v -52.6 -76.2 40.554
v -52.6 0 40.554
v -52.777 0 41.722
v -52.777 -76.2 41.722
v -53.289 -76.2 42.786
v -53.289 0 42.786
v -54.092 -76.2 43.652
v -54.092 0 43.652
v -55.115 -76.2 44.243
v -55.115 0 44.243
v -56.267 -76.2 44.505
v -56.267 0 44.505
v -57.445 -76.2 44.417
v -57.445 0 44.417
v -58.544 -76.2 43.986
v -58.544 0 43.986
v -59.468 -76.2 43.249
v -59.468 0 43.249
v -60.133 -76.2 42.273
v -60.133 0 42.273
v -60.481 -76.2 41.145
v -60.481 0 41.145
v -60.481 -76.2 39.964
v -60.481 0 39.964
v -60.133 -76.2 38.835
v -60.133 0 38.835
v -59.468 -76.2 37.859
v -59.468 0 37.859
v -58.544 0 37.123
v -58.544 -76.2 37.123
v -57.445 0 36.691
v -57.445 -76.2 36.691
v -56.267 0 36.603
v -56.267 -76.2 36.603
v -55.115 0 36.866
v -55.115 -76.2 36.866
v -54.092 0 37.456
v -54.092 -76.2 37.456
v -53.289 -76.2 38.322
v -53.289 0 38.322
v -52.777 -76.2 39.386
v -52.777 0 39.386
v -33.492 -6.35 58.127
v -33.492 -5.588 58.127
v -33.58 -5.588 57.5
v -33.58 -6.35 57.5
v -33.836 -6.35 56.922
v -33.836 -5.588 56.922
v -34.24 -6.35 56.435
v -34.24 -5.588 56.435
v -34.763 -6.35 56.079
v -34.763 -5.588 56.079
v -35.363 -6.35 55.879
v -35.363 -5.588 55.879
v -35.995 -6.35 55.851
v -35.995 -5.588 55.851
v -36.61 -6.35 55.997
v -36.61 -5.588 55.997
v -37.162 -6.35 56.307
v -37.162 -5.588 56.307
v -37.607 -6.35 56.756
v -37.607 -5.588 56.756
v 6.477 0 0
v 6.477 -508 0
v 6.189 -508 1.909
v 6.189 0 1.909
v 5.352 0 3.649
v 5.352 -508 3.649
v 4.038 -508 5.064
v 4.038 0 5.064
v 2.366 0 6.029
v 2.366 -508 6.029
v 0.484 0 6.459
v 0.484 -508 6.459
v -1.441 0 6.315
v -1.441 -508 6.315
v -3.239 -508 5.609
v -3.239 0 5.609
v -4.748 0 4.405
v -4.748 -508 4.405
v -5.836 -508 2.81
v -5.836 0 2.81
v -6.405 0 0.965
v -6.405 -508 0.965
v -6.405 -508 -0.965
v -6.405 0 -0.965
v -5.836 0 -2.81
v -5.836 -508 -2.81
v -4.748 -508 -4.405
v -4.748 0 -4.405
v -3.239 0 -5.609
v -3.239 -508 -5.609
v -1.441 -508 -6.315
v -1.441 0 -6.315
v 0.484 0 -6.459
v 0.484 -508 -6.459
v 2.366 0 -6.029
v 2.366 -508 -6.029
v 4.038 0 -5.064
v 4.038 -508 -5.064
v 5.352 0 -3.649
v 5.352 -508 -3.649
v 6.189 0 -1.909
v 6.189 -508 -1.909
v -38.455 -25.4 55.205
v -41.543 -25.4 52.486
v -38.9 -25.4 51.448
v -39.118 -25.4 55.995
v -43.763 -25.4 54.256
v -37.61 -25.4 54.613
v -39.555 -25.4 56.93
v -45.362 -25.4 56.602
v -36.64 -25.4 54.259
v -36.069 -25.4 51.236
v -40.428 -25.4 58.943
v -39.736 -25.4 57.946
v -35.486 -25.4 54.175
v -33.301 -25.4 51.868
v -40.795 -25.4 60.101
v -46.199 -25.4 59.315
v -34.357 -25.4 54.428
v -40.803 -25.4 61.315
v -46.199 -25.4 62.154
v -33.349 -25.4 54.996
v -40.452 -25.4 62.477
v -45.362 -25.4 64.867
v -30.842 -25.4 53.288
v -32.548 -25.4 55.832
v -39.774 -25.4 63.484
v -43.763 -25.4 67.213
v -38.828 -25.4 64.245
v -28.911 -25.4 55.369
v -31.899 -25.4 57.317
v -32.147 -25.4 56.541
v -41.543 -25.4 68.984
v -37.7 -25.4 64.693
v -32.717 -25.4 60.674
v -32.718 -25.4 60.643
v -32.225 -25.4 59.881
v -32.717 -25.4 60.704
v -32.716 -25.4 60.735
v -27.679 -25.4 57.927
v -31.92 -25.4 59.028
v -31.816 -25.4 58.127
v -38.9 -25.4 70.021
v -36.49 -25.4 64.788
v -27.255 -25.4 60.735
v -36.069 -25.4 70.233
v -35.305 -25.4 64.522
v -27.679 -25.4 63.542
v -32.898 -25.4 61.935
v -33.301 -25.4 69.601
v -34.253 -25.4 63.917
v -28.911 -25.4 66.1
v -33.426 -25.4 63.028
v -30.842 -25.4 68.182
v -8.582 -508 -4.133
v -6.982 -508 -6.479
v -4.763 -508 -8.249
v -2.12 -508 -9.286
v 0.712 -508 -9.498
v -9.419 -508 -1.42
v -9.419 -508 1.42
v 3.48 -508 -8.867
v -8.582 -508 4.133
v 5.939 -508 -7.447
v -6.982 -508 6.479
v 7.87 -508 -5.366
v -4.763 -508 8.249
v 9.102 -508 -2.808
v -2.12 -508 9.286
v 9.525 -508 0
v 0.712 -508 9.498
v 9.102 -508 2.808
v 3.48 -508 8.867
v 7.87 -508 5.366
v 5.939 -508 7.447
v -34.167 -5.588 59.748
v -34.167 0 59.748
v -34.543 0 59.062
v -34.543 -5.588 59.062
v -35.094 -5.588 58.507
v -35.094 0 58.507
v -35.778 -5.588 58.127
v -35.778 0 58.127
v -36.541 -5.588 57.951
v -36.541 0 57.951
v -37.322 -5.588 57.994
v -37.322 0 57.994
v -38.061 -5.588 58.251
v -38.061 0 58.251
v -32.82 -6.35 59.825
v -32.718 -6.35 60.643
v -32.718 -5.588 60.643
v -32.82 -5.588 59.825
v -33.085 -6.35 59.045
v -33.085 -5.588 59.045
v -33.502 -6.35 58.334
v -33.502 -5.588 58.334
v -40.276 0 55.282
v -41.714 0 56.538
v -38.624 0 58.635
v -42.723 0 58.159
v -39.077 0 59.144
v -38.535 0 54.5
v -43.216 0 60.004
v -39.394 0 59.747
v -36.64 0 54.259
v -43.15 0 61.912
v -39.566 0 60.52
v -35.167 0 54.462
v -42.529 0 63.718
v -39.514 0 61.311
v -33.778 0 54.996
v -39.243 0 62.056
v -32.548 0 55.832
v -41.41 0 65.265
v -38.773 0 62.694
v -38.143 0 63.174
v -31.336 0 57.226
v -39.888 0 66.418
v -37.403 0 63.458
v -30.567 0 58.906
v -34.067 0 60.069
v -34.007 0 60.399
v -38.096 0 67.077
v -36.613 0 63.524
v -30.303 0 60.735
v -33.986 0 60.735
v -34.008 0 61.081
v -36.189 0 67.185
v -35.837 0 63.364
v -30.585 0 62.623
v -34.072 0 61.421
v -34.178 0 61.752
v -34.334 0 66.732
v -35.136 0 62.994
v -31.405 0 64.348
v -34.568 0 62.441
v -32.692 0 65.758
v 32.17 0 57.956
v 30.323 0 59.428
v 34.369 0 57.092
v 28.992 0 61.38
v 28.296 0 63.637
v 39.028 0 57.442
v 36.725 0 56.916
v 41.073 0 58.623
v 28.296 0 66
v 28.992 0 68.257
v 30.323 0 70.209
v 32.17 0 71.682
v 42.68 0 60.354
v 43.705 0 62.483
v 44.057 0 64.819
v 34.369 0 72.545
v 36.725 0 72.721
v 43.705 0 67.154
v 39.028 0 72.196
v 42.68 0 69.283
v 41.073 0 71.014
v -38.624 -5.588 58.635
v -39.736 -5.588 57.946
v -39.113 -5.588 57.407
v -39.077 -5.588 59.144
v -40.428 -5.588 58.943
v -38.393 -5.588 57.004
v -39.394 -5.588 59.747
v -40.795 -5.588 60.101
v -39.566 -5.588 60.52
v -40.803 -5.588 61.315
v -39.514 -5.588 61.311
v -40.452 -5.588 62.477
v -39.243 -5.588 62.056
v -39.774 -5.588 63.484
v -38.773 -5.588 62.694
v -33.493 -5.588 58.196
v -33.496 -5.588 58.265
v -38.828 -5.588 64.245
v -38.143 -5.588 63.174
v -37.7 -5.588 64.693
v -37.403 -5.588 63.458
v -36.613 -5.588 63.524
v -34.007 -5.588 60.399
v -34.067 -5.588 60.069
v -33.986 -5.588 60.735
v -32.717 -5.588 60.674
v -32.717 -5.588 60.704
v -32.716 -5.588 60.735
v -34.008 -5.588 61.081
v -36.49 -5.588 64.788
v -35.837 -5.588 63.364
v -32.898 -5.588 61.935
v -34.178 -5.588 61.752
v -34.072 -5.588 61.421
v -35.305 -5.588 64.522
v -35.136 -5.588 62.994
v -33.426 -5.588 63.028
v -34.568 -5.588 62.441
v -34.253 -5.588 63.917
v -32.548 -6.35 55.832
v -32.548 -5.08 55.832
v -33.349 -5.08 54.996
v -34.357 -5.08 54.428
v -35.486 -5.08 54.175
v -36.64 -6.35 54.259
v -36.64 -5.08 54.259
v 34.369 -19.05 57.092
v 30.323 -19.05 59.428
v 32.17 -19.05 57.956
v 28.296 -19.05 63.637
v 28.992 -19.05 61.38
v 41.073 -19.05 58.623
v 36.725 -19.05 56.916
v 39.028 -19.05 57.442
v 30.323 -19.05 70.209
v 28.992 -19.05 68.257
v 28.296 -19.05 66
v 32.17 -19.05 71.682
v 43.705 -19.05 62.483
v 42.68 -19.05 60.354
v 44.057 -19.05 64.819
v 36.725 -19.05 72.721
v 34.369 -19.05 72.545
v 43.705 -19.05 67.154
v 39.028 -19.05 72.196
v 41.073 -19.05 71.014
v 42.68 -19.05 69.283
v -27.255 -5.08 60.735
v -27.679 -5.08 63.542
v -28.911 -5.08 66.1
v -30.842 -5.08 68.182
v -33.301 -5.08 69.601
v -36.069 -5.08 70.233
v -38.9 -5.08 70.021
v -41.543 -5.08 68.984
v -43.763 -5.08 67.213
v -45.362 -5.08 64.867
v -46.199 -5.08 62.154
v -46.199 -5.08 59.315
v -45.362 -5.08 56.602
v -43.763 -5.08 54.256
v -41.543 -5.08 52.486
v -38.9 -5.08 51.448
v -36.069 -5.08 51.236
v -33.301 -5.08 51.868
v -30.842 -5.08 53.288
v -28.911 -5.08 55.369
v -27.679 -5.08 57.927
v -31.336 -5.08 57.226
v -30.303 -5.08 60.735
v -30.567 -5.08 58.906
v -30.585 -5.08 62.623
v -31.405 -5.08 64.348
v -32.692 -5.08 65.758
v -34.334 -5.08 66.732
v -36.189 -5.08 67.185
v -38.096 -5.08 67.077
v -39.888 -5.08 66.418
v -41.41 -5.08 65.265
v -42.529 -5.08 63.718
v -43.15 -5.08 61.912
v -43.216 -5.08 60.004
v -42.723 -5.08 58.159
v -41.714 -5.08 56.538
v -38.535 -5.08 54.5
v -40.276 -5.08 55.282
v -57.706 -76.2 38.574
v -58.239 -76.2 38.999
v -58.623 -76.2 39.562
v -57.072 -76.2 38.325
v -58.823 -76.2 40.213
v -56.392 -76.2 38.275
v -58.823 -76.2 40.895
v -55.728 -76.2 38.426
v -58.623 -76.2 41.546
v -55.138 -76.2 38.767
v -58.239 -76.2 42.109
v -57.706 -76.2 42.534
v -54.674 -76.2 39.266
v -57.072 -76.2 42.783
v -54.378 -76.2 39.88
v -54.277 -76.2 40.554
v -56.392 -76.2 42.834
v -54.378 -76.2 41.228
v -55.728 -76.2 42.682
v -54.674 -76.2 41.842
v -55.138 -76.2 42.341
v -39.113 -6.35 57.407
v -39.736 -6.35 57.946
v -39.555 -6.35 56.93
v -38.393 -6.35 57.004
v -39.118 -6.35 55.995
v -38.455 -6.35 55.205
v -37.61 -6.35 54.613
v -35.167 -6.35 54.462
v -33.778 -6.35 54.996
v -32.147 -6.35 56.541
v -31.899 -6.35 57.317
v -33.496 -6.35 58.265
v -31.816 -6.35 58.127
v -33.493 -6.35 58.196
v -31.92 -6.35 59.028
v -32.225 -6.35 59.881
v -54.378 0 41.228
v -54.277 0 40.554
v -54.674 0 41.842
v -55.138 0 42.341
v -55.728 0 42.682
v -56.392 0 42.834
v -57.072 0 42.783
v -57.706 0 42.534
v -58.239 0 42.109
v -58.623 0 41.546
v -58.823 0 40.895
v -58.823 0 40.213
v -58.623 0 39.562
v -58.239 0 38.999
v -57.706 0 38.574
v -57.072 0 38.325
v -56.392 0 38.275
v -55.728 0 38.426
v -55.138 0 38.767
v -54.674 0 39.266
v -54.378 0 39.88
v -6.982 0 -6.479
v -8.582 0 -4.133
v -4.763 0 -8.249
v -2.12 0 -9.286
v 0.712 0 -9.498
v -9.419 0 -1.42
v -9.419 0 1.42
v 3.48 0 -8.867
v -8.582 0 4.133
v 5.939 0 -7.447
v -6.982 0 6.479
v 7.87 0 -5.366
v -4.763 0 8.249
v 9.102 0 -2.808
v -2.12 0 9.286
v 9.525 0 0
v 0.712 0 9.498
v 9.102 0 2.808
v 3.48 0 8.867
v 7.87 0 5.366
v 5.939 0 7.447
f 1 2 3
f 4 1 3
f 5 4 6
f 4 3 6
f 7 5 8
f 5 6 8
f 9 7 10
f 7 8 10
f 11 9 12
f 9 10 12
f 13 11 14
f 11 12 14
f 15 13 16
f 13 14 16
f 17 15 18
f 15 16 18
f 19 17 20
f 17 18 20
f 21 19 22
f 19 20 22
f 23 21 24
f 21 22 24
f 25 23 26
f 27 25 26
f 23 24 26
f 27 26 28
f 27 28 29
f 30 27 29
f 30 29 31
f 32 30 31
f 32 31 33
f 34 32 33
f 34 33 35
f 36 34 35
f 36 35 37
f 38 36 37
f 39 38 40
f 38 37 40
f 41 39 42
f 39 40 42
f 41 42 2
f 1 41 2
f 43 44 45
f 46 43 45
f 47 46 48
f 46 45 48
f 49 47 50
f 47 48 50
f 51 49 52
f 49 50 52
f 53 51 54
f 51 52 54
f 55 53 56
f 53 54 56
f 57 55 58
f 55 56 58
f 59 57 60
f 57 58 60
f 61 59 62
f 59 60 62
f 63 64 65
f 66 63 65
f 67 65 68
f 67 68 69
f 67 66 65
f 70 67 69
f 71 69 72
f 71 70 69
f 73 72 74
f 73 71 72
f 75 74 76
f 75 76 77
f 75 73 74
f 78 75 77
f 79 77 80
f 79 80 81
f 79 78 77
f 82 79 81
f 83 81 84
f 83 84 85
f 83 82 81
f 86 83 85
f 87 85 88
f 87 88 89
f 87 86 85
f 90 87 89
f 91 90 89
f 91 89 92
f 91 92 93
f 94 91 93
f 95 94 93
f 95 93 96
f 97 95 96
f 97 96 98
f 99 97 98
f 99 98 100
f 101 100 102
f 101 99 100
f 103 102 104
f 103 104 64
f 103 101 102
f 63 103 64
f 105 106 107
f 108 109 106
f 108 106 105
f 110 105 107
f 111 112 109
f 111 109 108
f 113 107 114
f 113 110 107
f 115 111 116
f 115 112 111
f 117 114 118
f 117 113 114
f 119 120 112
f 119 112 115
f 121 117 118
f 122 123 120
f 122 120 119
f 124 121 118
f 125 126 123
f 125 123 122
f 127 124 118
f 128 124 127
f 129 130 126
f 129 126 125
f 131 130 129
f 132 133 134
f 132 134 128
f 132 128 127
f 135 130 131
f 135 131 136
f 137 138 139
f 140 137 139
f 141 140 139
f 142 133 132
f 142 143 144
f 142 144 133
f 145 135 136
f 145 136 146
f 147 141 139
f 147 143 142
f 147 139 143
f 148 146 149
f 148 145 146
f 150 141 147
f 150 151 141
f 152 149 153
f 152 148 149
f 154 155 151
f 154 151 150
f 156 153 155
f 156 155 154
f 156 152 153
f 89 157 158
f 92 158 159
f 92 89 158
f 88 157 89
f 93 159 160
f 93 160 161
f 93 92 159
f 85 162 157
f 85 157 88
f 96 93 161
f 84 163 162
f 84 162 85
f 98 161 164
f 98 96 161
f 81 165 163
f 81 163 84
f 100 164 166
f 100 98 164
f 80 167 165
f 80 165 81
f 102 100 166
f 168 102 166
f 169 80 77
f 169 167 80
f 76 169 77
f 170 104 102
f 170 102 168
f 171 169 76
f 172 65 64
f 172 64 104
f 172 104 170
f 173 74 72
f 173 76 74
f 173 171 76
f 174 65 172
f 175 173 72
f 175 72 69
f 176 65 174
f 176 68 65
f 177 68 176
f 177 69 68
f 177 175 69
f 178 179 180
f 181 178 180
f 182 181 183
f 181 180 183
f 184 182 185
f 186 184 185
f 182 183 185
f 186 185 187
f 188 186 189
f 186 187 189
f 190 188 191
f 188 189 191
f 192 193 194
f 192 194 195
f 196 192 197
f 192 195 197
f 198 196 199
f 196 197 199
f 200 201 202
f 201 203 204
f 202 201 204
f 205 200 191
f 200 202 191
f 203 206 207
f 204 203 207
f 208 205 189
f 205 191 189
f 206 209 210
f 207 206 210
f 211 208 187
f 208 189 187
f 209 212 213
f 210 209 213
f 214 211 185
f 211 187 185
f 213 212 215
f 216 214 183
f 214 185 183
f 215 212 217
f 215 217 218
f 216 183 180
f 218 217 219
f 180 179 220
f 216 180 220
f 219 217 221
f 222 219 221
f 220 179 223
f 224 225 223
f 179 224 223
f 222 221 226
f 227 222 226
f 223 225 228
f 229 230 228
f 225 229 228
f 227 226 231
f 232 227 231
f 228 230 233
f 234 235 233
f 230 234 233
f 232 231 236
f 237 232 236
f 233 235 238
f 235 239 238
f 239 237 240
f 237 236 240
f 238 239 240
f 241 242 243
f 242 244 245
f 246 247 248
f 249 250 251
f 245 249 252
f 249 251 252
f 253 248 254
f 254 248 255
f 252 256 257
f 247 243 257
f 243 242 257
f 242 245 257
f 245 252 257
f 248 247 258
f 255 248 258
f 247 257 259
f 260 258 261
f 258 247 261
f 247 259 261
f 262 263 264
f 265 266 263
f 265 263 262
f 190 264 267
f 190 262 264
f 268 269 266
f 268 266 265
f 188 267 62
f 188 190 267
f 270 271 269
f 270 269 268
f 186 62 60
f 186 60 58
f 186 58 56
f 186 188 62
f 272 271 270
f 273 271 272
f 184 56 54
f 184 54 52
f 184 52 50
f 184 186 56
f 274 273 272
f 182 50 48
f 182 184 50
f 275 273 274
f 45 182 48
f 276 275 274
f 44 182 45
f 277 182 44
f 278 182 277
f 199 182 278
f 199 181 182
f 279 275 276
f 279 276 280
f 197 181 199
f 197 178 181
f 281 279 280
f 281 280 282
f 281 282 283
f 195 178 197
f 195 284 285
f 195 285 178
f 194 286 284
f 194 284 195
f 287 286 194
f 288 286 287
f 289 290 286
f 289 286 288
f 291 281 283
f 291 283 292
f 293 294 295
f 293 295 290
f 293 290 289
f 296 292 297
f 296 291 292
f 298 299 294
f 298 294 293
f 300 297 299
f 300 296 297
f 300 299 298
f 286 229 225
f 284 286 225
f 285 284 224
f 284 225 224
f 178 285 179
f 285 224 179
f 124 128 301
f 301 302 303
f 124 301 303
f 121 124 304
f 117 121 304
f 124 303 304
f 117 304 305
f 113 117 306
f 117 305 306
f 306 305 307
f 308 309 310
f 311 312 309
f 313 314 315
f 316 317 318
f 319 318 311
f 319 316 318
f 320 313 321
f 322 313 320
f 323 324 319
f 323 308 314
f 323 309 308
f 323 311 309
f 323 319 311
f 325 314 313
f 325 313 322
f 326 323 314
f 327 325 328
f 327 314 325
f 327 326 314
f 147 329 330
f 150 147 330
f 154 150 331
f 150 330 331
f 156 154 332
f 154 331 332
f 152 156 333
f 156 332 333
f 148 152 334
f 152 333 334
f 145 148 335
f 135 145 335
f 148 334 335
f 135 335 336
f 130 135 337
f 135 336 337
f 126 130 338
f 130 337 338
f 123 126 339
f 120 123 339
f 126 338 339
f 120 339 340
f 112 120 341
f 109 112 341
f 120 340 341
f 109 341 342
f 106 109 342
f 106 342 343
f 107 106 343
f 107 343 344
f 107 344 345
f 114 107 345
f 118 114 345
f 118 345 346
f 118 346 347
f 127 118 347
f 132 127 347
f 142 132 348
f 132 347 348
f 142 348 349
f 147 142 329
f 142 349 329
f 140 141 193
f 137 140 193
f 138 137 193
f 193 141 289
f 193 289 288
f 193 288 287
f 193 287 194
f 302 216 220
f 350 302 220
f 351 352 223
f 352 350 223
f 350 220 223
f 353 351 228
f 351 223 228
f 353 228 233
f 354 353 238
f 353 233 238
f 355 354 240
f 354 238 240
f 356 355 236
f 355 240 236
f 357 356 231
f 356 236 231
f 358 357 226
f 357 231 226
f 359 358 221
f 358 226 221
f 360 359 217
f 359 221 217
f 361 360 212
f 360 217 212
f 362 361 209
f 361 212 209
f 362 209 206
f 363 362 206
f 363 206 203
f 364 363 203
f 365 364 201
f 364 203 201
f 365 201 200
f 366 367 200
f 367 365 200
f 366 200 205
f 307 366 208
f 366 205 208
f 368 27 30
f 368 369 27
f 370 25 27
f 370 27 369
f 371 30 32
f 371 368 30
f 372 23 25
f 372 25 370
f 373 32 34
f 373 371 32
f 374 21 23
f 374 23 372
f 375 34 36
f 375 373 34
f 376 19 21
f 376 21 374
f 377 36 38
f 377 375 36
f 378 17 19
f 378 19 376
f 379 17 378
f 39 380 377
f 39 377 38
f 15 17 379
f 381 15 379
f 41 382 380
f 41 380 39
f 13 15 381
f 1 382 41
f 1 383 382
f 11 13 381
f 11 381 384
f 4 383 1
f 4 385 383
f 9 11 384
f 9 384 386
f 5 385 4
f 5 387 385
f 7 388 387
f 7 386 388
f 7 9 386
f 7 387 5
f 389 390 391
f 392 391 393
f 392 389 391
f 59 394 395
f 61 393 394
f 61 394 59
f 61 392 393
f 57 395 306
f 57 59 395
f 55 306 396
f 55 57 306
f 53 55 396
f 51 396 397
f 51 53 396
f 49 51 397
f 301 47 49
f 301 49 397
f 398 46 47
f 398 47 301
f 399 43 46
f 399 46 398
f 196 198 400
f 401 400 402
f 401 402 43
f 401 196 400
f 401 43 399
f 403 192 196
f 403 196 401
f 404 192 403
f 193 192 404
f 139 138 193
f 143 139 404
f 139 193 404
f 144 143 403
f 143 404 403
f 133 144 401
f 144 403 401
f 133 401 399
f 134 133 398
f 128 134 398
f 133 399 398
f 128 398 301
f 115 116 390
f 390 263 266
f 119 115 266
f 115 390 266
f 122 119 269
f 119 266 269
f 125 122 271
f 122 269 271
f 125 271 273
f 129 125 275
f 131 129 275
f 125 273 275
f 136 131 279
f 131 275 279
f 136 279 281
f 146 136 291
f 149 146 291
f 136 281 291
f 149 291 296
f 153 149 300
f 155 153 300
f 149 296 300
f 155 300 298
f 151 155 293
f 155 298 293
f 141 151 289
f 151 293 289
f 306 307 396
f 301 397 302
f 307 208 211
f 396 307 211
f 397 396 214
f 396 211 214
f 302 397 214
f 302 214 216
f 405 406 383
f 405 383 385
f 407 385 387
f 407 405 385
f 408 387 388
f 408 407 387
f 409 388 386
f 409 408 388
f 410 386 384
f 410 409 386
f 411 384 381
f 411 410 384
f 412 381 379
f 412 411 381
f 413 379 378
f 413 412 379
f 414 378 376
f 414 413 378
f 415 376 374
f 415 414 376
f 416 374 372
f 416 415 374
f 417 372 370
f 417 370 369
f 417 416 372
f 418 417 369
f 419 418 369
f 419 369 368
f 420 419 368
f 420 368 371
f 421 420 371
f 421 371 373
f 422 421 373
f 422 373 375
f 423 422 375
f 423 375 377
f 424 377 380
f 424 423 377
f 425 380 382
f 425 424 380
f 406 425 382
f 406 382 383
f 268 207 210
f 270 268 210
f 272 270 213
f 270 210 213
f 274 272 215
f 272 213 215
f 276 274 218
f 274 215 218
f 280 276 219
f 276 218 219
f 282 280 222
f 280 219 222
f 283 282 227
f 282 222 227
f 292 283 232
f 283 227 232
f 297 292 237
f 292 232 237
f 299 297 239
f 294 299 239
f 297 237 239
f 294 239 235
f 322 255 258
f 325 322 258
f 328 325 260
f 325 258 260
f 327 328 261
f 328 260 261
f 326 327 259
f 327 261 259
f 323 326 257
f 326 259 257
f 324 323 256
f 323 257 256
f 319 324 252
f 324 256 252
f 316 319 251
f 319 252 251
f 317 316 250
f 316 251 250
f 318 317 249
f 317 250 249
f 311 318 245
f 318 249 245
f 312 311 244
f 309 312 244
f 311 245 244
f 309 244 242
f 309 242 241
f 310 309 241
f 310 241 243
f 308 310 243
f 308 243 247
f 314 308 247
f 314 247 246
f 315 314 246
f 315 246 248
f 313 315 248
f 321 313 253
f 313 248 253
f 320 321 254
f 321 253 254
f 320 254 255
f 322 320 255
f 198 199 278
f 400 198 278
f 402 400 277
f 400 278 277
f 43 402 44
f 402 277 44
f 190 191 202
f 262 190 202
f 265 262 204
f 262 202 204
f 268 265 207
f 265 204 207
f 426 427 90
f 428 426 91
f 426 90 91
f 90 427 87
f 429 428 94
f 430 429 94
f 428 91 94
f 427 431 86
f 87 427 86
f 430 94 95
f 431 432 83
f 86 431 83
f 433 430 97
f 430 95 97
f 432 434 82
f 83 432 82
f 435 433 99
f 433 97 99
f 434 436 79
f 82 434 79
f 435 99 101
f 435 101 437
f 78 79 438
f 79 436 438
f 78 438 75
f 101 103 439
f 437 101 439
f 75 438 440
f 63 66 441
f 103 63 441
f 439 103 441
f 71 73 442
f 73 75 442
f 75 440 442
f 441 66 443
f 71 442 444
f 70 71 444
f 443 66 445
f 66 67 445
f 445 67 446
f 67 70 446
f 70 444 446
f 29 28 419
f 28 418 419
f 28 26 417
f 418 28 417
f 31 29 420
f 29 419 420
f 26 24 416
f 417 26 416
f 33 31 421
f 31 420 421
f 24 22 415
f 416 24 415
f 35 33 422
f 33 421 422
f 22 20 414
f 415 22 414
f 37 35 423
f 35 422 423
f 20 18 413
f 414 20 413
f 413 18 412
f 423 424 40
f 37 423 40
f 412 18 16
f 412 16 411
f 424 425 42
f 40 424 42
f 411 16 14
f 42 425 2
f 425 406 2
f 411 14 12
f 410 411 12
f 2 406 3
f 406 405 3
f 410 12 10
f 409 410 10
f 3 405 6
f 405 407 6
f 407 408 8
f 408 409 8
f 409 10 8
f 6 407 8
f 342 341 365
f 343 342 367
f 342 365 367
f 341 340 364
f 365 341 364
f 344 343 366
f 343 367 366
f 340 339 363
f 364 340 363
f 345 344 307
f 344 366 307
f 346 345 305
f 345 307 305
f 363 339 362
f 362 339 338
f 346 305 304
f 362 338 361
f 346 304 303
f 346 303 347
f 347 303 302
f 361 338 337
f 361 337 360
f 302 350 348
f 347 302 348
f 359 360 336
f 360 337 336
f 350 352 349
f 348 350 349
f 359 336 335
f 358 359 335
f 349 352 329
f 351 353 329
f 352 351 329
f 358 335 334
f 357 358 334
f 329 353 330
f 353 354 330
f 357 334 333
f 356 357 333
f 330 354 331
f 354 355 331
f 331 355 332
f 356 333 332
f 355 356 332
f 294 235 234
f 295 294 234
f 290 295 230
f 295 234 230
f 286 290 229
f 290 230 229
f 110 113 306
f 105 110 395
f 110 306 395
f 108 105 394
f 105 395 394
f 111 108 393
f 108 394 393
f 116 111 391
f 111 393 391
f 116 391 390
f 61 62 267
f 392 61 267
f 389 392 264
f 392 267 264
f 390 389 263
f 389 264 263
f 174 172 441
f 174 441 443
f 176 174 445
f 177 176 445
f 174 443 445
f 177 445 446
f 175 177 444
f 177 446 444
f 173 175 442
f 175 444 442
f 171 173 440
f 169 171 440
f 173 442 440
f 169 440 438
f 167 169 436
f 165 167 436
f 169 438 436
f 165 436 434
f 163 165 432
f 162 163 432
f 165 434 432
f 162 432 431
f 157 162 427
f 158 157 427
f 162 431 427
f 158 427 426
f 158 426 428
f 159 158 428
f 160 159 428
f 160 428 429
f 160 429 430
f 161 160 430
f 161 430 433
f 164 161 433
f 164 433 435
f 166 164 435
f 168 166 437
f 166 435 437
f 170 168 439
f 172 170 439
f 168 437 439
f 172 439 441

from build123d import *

# Parameters (mm, degrees)
F0_R     = 9.525
F0_R_2   = 6.477
F1_DEPTH = 508
F2_DEPTH = 19.05
F0_R_3   = 7.9248
F3_DEPTH = 6.35
F4_DEPTH = 5.588
F5_START = 5.08
F5_DEPTH = 20.32
F6_DEPTH = 6.35
F7_DEPTH = 5.588
F0_R_4   = 3.9624
F0_R_5   = 2.286
F8_DEPTH = 76.2


with BuildPart() as f1:
    # F0 (on Front) → F1 (new body)
    with BuildSketch(Plane.XZ):
        Circle(F0_R)
        Circle(F0_R_2, mode=Mode.SUBTRACT)
    extrude(amount=F1_DEPTH)


with BuildPart() as f2:
    # F0 (on Front) → F2 (new body)
    with BuildSketch(Plane.XZ):
        with BuildLine():
            ThreePointArc((-32.547757087, 55.8320304582), (-30.8912183046, 58.0386997075), (-30.3034840207, 60.7346370816))
            ThreePointArc((-30.3034840207, 60.7346370816), (-41.4096977129, 65.2647485143), (-36.6403404641, 54.2591534098))
            ThreePointArc((-36.6403404641, 54.2591534098), (-38.8124164864, 55.5783024206), (-39.7364239778, 57.9456381626))
            ThreePointArc((-39.7364239778, 57.9456381626), (-38.2810099309, 64.5114767648), (-32.7164840207, 60.7346370816))
            ThreePointArc((-32.7164840207, 60.7346370816), (-32.7167413759, 60.6889017907), (-32.7175134089, 60.6431722922))
            ThreePointArc((-32.7175134089, 60.6431722922), (-32.0480038214, 59.4632357327), (-31.815759049, 58.1266147176))
            ThreePointArc((-31.815759049, 58.1266147176), (-32.0031915992, 56.9223578875), (-32.547757087, 55.8320304582))
        make_face()
    extrude(amount=F2_DEPTH)

    # F3 (add): a face of the model
    f3_faces = [f2.faces().sort_by_distance(p)[0] for p in [
        (-31.6351399696, -19.05, 58.2727969972),
    ]]
    extrude(f3_faces, amount=F3_DEPTH)

    # F0 (on Front) → F4 (join)
    with BuildSketch(Plane.XZ):
        with BuildLine():
            ThreePointArc((-39.394098101, 59.7469845926), (-39.6708899318, 58.8663849751), (-39.7364239778, 57.9456381626))
            ThreePointArc((-39.7364239778, 57.9456381626), (-38.7633091915, 57.1871731506), (-37.6074454536, 56.7556634968))
            ThreePointArc((-37.6074454536, 56.7556634968), (-37.9658706012, 57.4635052515), (-38.0607601848, 58.2512263335))
            ThreePointArc((-38.0607601848, 58.2512263335), (-38.8661298443, 58.8754658957), (-39.394098101, 59.7469845926))
        make_face()
        with BuildLine():
            ThreePointArc((-38.0607601848, 58.2512263335), (-37.9658706012, 57.4635052515), (-37.6074454536, 56.7556634968))
            ThreePointArc((-37.6074454536, 56.7556634968), (-35.3225567891, 56.9411500067), (-33.5015540619, 58.3336551314))
            ThreePointArc((-33.5015540619, 58.3336551314), (-33.7094444319, 59.0993509785), (-34.1665357868, 59.7478693123))
            ThreePointArc((-34.1665357868, 59.7478693123), (-35.778159049, 58.1266147176), (-38.0607601848, 58.2512263335))
        make_face()
        with BuildLine():
            ThreePointArc((-33.5015540619, 58.3336551314), (-32.9321930525, 59.4282096539), (-32.7175134089, 60.6431722922))
            ThreePointArc((-32.7175134089, 60.6431722922), (-33.3828274746, 61.2830368074), (-34.1781357417, 61.7516028799))
            ThreePointArc((-34.1781357417, 61.7516028799), (-34.0348149682, 61.252070608), (-33.9864840207, 60.7346370816))
            ThreePointArc((-33.9864840207, 60.7346370816), (-34.0318655163, 60.2331071052), (-34.1665357868, 59.7478693123))
            ThreePointArc((-34.1665357868, 59.7478693123), (-33.7094444319, 59.0993509785), (-33.5015540619, 58.3336551314))
        make_face()
        with BuildLine():
            ThreePointArc((-32.7164840207, 60.7346370816), (-38.2810099309, 64.5114767648), (-39.7364239778, 57.9456381626))
            ThreePointArc((-39.7364239778, 57.9456381626), (-39.6708899318, 58.8663849751), (-39.394098101, 59.7469845926))
            ThreePointArc((-39.394098101, 59.7469845926), (-37.7828089924, 63.3426594456), (-34.1781357417, 61.7516028799))
            ThreePointArc((-34.1781357417, 61.7516028799), (-33.3828274746, 61.2830368074), (-32.7175134089, 60.6431722922))
            ThreePointArc((-32.7175134089, 60.6431722922), (-32.7167413759, 60.6889017907), (-32.7164840207, 60.7346370816))
        make_face()
    extrude(amount=F4_DEPTH)

    # F0 (on Front) → F5 (join)
    with BuildSketch(Plane.XZ.offset(F5_START)):
        with Locations((-36.7804840207, 60.7346370816)):
            Circle(F0_R)
        with BuildLine():
            ThreePointArc((-36.6403404641, 54.2591534098), (-41.4096977129, 65.2647485143), (-30.3034840207, 60.7346370816))
            ThreePointArc((-30.3034840207, 60.7346370816), (-30.8912183046, 58.0386997075), (-32.547757087, 55.8320304582))
            ThreePointArc((-32.547757087, 55.8320304582), (-34.3566799981, 54.4279648196), (-36.6403404641, 54.2591534098))
        make_face(mode=Mode.SUBTRACT)
    extrude(amount=F5_DEPTH)

    # F0 (on Front) → F6 (join)
    with BuildSketch(Plane.XZ):
        with BuildLine():
            ThreePointArc((-39.7364239778, 57.9456381626), (-38.8124164864, 55.5783024206), (-36.6403404641, 54.2591534098))
            ThreePointArc((-36.6403404641, 54.2591534098), (-34.4569124953, 54.688767056), (-32.547757087, 55.8320304582))
            ThreePointArc((-32.547757087, 55.8320304582), (-32.0031915992, 56.9223578875), (-31.815759049, 58.1266147176))
            ThreePointArc((-31.815759049, 58.1266147176), (-32.0480038214, 59.4632357327), (-32.7175134089, 60.6431722922))
            ThreePointArc((-32.7175134089, 60.6431722922), (-32.9321930525, 59.4282096539), (-33.5015540619, 58.3336551314))
            ThreePointArc((-33.5015540619, 58.3336551314), (-33.4945090101, 58.2302414507), (-33.492159049, 58.1266147176))
            ThreePointArc((-33.492159049, 58.1266147176), (-35.0556470148, 55.9577965232), (-37.6074454536, 56.7556634968))
            ThreePointArc((-37.6074454536, 56.7556634968), (-38.7633091915, 57.1871731506), (-39.7364239778, 57.9456381626))
        make_face()
    extrude(amount=F6_DEPTH)

    # F0 (on Front) → F7 (join)
    with BuildSketch(Plane.XZ):
        with BuildLine():
            ThreePointArc((-33.5015540619, 58.3336551314), (-35.3225567891, 56.9411500067), (-37.6074454536, 56.7556634968))
            ThreePointArc((-37.6074454536, 56.7556634968), (-35.0556470148, 55.9577965232), (-33.492159049, 58.1266147176))
            ThreePointArc((-33.492159049, 58.1266147176), (-33.4945090101, 58.2302414507), (-33.5015540619, 58.3336551314))
        make_face()
    extrude(amount=F7_DEPTH)


with BuildPart() as f2b:
    # F0 (on Front) → F2, piece 2 (new body)
    with BuildSketch(Plane.XZ):
        with Locations((36.1323542893, 64.8185908794)):
            Circle(F0_R_3)
    extrude(amount=F2_DEPTH)


with BuildPart() as f8:
    # F0 (on Front) → F8 (new body)
    with BuildSketch(Plane.XZ):
        with Locations((-56.5628893673, 40.5541695654)):
            Circle(F0_R_4)
        with Locations((-56.5628893673, 40.5541695654)):
            Circle(F0_R_5, mode=Mode.SUBTRACT)
    extrude(amount=F8_DEPTH)


solid = Compound([f1.part, f2.part, f2b.part, f8.part])
